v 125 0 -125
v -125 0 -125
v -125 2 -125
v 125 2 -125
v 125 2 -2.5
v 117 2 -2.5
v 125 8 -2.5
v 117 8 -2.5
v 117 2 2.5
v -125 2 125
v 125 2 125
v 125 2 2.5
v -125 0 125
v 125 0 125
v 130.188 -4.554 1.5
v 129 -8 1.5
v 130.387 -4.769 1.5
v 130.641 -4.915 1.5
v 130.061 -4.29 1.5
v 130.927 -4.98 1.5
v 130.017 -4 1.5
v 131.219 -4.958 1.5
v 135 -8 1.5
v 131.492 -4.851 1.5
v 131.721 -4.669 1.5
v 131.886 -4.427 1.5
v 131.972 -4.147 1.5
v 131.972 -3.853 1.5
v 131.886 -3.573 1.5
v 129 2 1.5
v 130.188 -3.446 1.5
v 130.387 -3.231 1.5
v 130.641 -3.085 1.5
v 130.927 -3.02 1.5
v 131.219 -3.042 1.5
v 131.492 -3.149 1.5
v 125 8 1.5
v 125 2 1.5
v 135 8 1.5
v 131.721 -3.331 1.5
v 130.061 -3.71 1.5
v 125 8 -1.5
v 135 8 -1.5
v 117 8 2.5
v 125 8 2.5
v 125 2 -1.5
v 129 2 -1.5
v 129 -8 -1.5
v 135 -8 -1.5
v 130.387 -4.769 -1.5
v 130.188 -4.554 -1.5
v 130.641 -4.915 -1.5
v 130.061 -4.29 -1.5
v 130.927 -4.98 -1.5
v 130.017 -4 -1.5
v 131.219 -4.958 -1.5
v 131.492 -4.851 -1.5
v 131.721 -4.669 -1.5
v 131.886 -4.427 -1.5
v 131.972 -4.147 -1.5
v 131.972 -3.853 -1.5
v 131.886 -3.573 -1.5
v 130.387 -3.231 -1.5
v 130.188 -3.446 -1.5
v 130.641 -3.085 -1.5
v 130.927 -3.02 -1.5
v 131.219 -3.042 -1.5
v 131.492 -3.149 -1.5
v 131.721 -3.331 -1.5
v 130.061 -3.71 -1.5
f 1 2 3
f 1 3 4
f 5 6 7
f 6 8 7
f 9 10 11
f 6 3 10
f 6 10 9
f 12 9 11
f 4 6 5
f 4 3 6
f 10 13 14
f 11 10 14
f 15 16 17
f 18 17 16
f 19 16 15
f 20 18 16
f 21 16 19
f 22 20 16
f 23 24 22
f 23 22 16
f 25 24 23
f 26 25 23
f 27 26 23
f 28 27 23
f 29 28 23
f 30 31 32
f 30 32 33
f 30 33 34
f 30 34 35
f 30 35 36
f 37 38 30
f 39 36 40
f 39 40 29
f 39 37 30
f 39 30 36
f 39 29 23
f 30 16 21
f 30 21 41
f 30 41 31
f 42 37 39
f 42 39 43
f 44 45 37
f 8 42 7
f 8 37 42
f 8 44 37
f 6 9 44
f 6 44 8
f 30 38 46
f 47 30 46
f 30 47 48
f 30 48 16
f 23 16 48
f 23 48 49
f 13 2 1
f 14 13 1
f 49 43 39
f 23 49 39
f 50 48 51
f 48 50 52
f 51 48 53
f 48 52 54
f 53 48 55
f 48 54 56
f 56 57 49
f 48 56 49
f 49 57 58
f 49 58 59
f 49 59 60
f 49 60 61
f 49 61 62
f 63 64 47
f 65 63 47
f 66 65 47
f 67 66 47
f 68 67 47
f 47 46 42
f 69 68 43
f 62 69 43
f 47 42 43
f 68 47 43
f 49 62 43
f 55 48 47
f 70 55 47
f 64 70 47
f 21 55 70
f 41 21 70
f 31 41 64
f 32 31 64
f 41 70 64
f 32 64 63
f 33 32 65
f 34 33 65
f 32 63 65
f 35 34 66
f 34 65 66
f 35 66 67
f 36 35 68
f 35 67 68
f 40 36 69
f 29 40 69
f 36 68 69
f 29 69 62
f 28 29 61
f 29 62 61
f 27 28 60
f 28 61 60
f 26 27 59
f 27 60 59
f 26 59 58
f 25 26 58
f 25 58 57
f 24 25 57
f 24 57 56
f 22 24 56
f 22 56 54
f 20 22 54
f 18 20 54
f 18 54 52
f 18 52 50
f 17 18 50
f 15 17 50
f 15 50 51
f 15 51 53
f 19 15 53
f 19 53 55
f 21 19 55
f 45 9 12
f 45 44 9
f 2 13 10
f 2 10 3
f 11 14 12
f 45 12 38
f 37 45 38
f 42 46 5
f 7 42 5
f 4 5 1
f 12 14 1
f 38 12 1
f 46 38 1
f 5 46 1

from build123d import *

# Parameters (mm, degrees)
CROQUIS1_W              = 250
CROQUIS1_H              = 250
SALIENTE_EXTRUIR1_DEPTH = 2
CROQUIS2_W              = 8
CROQUIS2_H              = 5
SALIENTE_EXTRUIR2_DEPTH = 6
CROQUIS3_W              = 5
CROQUIS3_H              = 6
SALIENTE_EXTRUIR3_DEPTH = 10
CROQUIS4_W              = 6
CROQUIS4_H              = 5
SALIENTE_EXTRUIR4_DEPTH = 10
CORTAR_EXTRUIR1_REACH   = 187.864
CROQUIS5_R              = 0.983022383
CORTAR_EXTRUIR2_REACH   = 186.678
CROQUIS6_W              = 10
CROQUIS6_H              = 1


with BuildPart() as part:
    # Croquis1 → Saliente-Extruir1 (new body)
    with BuildSketch(Plane(origin=(0, 0, 0), x_dir=(1, 0, 0), z_dir=(0, 1, 0))):
        Rectangle(CROQUIS1_W, CROQUIS1_H)
    extrude(amount=SALIENTE_EXTRUIR1_DEPTH)

    # Croquis2 → Saliente-Extruir2 (add)
    with BuildSketch(Plane(origin=(0, 2, 0), x_dir=(1, 0, 0), z_dir=(0, 1, 0))):
        with Locations((121, 0)):
            Rectangle(CROQUIS2_W, CROQUIS2_H)
    extrude(amount=SALIENTE_EXTRUIR2_DEPTH)

    # Croquis3 → Saliente-Extruir3 (add)
    with BuildSketch(Plane(origin=(125, 0, 0), x_dir=(0, 0, -1), z_dir=(1, 0, 0))):
        with Locations((0, 5)):
            Rectangle(CROQUIS3_W, CROQUIS3_H)
    extrude(amount=SALIENTE_EXTRUIR3_DEPTH)

    # Croquis4 → Saliente-Extruir4 (add)
    with BuildSketch(Plane.XZ.offset(-2)):
        with Locations((132, 0)):
            Rectangle(CROQUIS4_W, CROQUIS4_H)
    extrude(amount=SALIENTE_EXTRUIR4_DEPTH)

    # Croquis5 → Cortar-Extruir1 (cut, up to next)
    with BuildSketch(Plane(origin=(0, 0, -2.5), x_dir=(-1, 0, 0), z_dir=(0, 0, -1)), mode=Mode.PRIVATE) as cortar_extruir1_sk1:
        with Locations((-131, -4)):
            Circle(CROQUIS5_R)
    cortar_extruir1_tool1 = extrude(cortar_extruir1_sk1.sketch, amount=-CORTAR_EXTRUIR1_REACH, mode=Mode.PRIVATE) & part.part
    add(cortar_extruir1_tool1.solids().sort_by_distance((131, -4, -2.5))[0], mode=Mode.SUBTRACT)

    # Croquis6 → Cortar-Extruir2 (cut, up to next)
    with BuildSketch(Plane(origin=(0, 8, 0), x_dir=(1, 0, 0), z_dir=(0, 1, 0)), mode=Mode.PRIVATE) as cortar_extruir2_sk1:
        with Locations((130, -2)):
            Rectangle(CROQUIS6_W, CROQUIS6_H)
    cortar_extruir2_tool1 = extrude(cortar_extruir2_sk1.sketch, amount=-CORTAR_EXTRUIR2_REACH, mode=Mode.PRIVATE) & part.part
    # Croquis6 → Cortar-Extruir2 (cut, up to next)
    with BuildSketch(Plane(origin=(0, 8, 0), x_dir=(1, 0, 0), z_dir=(0, 1, 0)), mode=Mode.PRIVATE) as cortar_extruir2_sk2:
        with Locations((130, 2)):
            Rectangle(CROQUIS6_W, CROQUIS6_H)
    cortar_extruir2_tool2 = extrude(cortar_extruir2_sk2.sketch, amount=-CORTAR_EXTRUIR2_REACH, mode=Mode.PRIVATE) & part.part
    add(cortar_extruir2_tool1.solids().sort_by_distance((130, 8, 2))[0], mode=Mode.SUBTRACT)
    add(cortar_extruir2_tool2.solids().sort_by_distance((130, 8, -2))[0], mode=Mode.SUBTRACT)


solid = part.part
